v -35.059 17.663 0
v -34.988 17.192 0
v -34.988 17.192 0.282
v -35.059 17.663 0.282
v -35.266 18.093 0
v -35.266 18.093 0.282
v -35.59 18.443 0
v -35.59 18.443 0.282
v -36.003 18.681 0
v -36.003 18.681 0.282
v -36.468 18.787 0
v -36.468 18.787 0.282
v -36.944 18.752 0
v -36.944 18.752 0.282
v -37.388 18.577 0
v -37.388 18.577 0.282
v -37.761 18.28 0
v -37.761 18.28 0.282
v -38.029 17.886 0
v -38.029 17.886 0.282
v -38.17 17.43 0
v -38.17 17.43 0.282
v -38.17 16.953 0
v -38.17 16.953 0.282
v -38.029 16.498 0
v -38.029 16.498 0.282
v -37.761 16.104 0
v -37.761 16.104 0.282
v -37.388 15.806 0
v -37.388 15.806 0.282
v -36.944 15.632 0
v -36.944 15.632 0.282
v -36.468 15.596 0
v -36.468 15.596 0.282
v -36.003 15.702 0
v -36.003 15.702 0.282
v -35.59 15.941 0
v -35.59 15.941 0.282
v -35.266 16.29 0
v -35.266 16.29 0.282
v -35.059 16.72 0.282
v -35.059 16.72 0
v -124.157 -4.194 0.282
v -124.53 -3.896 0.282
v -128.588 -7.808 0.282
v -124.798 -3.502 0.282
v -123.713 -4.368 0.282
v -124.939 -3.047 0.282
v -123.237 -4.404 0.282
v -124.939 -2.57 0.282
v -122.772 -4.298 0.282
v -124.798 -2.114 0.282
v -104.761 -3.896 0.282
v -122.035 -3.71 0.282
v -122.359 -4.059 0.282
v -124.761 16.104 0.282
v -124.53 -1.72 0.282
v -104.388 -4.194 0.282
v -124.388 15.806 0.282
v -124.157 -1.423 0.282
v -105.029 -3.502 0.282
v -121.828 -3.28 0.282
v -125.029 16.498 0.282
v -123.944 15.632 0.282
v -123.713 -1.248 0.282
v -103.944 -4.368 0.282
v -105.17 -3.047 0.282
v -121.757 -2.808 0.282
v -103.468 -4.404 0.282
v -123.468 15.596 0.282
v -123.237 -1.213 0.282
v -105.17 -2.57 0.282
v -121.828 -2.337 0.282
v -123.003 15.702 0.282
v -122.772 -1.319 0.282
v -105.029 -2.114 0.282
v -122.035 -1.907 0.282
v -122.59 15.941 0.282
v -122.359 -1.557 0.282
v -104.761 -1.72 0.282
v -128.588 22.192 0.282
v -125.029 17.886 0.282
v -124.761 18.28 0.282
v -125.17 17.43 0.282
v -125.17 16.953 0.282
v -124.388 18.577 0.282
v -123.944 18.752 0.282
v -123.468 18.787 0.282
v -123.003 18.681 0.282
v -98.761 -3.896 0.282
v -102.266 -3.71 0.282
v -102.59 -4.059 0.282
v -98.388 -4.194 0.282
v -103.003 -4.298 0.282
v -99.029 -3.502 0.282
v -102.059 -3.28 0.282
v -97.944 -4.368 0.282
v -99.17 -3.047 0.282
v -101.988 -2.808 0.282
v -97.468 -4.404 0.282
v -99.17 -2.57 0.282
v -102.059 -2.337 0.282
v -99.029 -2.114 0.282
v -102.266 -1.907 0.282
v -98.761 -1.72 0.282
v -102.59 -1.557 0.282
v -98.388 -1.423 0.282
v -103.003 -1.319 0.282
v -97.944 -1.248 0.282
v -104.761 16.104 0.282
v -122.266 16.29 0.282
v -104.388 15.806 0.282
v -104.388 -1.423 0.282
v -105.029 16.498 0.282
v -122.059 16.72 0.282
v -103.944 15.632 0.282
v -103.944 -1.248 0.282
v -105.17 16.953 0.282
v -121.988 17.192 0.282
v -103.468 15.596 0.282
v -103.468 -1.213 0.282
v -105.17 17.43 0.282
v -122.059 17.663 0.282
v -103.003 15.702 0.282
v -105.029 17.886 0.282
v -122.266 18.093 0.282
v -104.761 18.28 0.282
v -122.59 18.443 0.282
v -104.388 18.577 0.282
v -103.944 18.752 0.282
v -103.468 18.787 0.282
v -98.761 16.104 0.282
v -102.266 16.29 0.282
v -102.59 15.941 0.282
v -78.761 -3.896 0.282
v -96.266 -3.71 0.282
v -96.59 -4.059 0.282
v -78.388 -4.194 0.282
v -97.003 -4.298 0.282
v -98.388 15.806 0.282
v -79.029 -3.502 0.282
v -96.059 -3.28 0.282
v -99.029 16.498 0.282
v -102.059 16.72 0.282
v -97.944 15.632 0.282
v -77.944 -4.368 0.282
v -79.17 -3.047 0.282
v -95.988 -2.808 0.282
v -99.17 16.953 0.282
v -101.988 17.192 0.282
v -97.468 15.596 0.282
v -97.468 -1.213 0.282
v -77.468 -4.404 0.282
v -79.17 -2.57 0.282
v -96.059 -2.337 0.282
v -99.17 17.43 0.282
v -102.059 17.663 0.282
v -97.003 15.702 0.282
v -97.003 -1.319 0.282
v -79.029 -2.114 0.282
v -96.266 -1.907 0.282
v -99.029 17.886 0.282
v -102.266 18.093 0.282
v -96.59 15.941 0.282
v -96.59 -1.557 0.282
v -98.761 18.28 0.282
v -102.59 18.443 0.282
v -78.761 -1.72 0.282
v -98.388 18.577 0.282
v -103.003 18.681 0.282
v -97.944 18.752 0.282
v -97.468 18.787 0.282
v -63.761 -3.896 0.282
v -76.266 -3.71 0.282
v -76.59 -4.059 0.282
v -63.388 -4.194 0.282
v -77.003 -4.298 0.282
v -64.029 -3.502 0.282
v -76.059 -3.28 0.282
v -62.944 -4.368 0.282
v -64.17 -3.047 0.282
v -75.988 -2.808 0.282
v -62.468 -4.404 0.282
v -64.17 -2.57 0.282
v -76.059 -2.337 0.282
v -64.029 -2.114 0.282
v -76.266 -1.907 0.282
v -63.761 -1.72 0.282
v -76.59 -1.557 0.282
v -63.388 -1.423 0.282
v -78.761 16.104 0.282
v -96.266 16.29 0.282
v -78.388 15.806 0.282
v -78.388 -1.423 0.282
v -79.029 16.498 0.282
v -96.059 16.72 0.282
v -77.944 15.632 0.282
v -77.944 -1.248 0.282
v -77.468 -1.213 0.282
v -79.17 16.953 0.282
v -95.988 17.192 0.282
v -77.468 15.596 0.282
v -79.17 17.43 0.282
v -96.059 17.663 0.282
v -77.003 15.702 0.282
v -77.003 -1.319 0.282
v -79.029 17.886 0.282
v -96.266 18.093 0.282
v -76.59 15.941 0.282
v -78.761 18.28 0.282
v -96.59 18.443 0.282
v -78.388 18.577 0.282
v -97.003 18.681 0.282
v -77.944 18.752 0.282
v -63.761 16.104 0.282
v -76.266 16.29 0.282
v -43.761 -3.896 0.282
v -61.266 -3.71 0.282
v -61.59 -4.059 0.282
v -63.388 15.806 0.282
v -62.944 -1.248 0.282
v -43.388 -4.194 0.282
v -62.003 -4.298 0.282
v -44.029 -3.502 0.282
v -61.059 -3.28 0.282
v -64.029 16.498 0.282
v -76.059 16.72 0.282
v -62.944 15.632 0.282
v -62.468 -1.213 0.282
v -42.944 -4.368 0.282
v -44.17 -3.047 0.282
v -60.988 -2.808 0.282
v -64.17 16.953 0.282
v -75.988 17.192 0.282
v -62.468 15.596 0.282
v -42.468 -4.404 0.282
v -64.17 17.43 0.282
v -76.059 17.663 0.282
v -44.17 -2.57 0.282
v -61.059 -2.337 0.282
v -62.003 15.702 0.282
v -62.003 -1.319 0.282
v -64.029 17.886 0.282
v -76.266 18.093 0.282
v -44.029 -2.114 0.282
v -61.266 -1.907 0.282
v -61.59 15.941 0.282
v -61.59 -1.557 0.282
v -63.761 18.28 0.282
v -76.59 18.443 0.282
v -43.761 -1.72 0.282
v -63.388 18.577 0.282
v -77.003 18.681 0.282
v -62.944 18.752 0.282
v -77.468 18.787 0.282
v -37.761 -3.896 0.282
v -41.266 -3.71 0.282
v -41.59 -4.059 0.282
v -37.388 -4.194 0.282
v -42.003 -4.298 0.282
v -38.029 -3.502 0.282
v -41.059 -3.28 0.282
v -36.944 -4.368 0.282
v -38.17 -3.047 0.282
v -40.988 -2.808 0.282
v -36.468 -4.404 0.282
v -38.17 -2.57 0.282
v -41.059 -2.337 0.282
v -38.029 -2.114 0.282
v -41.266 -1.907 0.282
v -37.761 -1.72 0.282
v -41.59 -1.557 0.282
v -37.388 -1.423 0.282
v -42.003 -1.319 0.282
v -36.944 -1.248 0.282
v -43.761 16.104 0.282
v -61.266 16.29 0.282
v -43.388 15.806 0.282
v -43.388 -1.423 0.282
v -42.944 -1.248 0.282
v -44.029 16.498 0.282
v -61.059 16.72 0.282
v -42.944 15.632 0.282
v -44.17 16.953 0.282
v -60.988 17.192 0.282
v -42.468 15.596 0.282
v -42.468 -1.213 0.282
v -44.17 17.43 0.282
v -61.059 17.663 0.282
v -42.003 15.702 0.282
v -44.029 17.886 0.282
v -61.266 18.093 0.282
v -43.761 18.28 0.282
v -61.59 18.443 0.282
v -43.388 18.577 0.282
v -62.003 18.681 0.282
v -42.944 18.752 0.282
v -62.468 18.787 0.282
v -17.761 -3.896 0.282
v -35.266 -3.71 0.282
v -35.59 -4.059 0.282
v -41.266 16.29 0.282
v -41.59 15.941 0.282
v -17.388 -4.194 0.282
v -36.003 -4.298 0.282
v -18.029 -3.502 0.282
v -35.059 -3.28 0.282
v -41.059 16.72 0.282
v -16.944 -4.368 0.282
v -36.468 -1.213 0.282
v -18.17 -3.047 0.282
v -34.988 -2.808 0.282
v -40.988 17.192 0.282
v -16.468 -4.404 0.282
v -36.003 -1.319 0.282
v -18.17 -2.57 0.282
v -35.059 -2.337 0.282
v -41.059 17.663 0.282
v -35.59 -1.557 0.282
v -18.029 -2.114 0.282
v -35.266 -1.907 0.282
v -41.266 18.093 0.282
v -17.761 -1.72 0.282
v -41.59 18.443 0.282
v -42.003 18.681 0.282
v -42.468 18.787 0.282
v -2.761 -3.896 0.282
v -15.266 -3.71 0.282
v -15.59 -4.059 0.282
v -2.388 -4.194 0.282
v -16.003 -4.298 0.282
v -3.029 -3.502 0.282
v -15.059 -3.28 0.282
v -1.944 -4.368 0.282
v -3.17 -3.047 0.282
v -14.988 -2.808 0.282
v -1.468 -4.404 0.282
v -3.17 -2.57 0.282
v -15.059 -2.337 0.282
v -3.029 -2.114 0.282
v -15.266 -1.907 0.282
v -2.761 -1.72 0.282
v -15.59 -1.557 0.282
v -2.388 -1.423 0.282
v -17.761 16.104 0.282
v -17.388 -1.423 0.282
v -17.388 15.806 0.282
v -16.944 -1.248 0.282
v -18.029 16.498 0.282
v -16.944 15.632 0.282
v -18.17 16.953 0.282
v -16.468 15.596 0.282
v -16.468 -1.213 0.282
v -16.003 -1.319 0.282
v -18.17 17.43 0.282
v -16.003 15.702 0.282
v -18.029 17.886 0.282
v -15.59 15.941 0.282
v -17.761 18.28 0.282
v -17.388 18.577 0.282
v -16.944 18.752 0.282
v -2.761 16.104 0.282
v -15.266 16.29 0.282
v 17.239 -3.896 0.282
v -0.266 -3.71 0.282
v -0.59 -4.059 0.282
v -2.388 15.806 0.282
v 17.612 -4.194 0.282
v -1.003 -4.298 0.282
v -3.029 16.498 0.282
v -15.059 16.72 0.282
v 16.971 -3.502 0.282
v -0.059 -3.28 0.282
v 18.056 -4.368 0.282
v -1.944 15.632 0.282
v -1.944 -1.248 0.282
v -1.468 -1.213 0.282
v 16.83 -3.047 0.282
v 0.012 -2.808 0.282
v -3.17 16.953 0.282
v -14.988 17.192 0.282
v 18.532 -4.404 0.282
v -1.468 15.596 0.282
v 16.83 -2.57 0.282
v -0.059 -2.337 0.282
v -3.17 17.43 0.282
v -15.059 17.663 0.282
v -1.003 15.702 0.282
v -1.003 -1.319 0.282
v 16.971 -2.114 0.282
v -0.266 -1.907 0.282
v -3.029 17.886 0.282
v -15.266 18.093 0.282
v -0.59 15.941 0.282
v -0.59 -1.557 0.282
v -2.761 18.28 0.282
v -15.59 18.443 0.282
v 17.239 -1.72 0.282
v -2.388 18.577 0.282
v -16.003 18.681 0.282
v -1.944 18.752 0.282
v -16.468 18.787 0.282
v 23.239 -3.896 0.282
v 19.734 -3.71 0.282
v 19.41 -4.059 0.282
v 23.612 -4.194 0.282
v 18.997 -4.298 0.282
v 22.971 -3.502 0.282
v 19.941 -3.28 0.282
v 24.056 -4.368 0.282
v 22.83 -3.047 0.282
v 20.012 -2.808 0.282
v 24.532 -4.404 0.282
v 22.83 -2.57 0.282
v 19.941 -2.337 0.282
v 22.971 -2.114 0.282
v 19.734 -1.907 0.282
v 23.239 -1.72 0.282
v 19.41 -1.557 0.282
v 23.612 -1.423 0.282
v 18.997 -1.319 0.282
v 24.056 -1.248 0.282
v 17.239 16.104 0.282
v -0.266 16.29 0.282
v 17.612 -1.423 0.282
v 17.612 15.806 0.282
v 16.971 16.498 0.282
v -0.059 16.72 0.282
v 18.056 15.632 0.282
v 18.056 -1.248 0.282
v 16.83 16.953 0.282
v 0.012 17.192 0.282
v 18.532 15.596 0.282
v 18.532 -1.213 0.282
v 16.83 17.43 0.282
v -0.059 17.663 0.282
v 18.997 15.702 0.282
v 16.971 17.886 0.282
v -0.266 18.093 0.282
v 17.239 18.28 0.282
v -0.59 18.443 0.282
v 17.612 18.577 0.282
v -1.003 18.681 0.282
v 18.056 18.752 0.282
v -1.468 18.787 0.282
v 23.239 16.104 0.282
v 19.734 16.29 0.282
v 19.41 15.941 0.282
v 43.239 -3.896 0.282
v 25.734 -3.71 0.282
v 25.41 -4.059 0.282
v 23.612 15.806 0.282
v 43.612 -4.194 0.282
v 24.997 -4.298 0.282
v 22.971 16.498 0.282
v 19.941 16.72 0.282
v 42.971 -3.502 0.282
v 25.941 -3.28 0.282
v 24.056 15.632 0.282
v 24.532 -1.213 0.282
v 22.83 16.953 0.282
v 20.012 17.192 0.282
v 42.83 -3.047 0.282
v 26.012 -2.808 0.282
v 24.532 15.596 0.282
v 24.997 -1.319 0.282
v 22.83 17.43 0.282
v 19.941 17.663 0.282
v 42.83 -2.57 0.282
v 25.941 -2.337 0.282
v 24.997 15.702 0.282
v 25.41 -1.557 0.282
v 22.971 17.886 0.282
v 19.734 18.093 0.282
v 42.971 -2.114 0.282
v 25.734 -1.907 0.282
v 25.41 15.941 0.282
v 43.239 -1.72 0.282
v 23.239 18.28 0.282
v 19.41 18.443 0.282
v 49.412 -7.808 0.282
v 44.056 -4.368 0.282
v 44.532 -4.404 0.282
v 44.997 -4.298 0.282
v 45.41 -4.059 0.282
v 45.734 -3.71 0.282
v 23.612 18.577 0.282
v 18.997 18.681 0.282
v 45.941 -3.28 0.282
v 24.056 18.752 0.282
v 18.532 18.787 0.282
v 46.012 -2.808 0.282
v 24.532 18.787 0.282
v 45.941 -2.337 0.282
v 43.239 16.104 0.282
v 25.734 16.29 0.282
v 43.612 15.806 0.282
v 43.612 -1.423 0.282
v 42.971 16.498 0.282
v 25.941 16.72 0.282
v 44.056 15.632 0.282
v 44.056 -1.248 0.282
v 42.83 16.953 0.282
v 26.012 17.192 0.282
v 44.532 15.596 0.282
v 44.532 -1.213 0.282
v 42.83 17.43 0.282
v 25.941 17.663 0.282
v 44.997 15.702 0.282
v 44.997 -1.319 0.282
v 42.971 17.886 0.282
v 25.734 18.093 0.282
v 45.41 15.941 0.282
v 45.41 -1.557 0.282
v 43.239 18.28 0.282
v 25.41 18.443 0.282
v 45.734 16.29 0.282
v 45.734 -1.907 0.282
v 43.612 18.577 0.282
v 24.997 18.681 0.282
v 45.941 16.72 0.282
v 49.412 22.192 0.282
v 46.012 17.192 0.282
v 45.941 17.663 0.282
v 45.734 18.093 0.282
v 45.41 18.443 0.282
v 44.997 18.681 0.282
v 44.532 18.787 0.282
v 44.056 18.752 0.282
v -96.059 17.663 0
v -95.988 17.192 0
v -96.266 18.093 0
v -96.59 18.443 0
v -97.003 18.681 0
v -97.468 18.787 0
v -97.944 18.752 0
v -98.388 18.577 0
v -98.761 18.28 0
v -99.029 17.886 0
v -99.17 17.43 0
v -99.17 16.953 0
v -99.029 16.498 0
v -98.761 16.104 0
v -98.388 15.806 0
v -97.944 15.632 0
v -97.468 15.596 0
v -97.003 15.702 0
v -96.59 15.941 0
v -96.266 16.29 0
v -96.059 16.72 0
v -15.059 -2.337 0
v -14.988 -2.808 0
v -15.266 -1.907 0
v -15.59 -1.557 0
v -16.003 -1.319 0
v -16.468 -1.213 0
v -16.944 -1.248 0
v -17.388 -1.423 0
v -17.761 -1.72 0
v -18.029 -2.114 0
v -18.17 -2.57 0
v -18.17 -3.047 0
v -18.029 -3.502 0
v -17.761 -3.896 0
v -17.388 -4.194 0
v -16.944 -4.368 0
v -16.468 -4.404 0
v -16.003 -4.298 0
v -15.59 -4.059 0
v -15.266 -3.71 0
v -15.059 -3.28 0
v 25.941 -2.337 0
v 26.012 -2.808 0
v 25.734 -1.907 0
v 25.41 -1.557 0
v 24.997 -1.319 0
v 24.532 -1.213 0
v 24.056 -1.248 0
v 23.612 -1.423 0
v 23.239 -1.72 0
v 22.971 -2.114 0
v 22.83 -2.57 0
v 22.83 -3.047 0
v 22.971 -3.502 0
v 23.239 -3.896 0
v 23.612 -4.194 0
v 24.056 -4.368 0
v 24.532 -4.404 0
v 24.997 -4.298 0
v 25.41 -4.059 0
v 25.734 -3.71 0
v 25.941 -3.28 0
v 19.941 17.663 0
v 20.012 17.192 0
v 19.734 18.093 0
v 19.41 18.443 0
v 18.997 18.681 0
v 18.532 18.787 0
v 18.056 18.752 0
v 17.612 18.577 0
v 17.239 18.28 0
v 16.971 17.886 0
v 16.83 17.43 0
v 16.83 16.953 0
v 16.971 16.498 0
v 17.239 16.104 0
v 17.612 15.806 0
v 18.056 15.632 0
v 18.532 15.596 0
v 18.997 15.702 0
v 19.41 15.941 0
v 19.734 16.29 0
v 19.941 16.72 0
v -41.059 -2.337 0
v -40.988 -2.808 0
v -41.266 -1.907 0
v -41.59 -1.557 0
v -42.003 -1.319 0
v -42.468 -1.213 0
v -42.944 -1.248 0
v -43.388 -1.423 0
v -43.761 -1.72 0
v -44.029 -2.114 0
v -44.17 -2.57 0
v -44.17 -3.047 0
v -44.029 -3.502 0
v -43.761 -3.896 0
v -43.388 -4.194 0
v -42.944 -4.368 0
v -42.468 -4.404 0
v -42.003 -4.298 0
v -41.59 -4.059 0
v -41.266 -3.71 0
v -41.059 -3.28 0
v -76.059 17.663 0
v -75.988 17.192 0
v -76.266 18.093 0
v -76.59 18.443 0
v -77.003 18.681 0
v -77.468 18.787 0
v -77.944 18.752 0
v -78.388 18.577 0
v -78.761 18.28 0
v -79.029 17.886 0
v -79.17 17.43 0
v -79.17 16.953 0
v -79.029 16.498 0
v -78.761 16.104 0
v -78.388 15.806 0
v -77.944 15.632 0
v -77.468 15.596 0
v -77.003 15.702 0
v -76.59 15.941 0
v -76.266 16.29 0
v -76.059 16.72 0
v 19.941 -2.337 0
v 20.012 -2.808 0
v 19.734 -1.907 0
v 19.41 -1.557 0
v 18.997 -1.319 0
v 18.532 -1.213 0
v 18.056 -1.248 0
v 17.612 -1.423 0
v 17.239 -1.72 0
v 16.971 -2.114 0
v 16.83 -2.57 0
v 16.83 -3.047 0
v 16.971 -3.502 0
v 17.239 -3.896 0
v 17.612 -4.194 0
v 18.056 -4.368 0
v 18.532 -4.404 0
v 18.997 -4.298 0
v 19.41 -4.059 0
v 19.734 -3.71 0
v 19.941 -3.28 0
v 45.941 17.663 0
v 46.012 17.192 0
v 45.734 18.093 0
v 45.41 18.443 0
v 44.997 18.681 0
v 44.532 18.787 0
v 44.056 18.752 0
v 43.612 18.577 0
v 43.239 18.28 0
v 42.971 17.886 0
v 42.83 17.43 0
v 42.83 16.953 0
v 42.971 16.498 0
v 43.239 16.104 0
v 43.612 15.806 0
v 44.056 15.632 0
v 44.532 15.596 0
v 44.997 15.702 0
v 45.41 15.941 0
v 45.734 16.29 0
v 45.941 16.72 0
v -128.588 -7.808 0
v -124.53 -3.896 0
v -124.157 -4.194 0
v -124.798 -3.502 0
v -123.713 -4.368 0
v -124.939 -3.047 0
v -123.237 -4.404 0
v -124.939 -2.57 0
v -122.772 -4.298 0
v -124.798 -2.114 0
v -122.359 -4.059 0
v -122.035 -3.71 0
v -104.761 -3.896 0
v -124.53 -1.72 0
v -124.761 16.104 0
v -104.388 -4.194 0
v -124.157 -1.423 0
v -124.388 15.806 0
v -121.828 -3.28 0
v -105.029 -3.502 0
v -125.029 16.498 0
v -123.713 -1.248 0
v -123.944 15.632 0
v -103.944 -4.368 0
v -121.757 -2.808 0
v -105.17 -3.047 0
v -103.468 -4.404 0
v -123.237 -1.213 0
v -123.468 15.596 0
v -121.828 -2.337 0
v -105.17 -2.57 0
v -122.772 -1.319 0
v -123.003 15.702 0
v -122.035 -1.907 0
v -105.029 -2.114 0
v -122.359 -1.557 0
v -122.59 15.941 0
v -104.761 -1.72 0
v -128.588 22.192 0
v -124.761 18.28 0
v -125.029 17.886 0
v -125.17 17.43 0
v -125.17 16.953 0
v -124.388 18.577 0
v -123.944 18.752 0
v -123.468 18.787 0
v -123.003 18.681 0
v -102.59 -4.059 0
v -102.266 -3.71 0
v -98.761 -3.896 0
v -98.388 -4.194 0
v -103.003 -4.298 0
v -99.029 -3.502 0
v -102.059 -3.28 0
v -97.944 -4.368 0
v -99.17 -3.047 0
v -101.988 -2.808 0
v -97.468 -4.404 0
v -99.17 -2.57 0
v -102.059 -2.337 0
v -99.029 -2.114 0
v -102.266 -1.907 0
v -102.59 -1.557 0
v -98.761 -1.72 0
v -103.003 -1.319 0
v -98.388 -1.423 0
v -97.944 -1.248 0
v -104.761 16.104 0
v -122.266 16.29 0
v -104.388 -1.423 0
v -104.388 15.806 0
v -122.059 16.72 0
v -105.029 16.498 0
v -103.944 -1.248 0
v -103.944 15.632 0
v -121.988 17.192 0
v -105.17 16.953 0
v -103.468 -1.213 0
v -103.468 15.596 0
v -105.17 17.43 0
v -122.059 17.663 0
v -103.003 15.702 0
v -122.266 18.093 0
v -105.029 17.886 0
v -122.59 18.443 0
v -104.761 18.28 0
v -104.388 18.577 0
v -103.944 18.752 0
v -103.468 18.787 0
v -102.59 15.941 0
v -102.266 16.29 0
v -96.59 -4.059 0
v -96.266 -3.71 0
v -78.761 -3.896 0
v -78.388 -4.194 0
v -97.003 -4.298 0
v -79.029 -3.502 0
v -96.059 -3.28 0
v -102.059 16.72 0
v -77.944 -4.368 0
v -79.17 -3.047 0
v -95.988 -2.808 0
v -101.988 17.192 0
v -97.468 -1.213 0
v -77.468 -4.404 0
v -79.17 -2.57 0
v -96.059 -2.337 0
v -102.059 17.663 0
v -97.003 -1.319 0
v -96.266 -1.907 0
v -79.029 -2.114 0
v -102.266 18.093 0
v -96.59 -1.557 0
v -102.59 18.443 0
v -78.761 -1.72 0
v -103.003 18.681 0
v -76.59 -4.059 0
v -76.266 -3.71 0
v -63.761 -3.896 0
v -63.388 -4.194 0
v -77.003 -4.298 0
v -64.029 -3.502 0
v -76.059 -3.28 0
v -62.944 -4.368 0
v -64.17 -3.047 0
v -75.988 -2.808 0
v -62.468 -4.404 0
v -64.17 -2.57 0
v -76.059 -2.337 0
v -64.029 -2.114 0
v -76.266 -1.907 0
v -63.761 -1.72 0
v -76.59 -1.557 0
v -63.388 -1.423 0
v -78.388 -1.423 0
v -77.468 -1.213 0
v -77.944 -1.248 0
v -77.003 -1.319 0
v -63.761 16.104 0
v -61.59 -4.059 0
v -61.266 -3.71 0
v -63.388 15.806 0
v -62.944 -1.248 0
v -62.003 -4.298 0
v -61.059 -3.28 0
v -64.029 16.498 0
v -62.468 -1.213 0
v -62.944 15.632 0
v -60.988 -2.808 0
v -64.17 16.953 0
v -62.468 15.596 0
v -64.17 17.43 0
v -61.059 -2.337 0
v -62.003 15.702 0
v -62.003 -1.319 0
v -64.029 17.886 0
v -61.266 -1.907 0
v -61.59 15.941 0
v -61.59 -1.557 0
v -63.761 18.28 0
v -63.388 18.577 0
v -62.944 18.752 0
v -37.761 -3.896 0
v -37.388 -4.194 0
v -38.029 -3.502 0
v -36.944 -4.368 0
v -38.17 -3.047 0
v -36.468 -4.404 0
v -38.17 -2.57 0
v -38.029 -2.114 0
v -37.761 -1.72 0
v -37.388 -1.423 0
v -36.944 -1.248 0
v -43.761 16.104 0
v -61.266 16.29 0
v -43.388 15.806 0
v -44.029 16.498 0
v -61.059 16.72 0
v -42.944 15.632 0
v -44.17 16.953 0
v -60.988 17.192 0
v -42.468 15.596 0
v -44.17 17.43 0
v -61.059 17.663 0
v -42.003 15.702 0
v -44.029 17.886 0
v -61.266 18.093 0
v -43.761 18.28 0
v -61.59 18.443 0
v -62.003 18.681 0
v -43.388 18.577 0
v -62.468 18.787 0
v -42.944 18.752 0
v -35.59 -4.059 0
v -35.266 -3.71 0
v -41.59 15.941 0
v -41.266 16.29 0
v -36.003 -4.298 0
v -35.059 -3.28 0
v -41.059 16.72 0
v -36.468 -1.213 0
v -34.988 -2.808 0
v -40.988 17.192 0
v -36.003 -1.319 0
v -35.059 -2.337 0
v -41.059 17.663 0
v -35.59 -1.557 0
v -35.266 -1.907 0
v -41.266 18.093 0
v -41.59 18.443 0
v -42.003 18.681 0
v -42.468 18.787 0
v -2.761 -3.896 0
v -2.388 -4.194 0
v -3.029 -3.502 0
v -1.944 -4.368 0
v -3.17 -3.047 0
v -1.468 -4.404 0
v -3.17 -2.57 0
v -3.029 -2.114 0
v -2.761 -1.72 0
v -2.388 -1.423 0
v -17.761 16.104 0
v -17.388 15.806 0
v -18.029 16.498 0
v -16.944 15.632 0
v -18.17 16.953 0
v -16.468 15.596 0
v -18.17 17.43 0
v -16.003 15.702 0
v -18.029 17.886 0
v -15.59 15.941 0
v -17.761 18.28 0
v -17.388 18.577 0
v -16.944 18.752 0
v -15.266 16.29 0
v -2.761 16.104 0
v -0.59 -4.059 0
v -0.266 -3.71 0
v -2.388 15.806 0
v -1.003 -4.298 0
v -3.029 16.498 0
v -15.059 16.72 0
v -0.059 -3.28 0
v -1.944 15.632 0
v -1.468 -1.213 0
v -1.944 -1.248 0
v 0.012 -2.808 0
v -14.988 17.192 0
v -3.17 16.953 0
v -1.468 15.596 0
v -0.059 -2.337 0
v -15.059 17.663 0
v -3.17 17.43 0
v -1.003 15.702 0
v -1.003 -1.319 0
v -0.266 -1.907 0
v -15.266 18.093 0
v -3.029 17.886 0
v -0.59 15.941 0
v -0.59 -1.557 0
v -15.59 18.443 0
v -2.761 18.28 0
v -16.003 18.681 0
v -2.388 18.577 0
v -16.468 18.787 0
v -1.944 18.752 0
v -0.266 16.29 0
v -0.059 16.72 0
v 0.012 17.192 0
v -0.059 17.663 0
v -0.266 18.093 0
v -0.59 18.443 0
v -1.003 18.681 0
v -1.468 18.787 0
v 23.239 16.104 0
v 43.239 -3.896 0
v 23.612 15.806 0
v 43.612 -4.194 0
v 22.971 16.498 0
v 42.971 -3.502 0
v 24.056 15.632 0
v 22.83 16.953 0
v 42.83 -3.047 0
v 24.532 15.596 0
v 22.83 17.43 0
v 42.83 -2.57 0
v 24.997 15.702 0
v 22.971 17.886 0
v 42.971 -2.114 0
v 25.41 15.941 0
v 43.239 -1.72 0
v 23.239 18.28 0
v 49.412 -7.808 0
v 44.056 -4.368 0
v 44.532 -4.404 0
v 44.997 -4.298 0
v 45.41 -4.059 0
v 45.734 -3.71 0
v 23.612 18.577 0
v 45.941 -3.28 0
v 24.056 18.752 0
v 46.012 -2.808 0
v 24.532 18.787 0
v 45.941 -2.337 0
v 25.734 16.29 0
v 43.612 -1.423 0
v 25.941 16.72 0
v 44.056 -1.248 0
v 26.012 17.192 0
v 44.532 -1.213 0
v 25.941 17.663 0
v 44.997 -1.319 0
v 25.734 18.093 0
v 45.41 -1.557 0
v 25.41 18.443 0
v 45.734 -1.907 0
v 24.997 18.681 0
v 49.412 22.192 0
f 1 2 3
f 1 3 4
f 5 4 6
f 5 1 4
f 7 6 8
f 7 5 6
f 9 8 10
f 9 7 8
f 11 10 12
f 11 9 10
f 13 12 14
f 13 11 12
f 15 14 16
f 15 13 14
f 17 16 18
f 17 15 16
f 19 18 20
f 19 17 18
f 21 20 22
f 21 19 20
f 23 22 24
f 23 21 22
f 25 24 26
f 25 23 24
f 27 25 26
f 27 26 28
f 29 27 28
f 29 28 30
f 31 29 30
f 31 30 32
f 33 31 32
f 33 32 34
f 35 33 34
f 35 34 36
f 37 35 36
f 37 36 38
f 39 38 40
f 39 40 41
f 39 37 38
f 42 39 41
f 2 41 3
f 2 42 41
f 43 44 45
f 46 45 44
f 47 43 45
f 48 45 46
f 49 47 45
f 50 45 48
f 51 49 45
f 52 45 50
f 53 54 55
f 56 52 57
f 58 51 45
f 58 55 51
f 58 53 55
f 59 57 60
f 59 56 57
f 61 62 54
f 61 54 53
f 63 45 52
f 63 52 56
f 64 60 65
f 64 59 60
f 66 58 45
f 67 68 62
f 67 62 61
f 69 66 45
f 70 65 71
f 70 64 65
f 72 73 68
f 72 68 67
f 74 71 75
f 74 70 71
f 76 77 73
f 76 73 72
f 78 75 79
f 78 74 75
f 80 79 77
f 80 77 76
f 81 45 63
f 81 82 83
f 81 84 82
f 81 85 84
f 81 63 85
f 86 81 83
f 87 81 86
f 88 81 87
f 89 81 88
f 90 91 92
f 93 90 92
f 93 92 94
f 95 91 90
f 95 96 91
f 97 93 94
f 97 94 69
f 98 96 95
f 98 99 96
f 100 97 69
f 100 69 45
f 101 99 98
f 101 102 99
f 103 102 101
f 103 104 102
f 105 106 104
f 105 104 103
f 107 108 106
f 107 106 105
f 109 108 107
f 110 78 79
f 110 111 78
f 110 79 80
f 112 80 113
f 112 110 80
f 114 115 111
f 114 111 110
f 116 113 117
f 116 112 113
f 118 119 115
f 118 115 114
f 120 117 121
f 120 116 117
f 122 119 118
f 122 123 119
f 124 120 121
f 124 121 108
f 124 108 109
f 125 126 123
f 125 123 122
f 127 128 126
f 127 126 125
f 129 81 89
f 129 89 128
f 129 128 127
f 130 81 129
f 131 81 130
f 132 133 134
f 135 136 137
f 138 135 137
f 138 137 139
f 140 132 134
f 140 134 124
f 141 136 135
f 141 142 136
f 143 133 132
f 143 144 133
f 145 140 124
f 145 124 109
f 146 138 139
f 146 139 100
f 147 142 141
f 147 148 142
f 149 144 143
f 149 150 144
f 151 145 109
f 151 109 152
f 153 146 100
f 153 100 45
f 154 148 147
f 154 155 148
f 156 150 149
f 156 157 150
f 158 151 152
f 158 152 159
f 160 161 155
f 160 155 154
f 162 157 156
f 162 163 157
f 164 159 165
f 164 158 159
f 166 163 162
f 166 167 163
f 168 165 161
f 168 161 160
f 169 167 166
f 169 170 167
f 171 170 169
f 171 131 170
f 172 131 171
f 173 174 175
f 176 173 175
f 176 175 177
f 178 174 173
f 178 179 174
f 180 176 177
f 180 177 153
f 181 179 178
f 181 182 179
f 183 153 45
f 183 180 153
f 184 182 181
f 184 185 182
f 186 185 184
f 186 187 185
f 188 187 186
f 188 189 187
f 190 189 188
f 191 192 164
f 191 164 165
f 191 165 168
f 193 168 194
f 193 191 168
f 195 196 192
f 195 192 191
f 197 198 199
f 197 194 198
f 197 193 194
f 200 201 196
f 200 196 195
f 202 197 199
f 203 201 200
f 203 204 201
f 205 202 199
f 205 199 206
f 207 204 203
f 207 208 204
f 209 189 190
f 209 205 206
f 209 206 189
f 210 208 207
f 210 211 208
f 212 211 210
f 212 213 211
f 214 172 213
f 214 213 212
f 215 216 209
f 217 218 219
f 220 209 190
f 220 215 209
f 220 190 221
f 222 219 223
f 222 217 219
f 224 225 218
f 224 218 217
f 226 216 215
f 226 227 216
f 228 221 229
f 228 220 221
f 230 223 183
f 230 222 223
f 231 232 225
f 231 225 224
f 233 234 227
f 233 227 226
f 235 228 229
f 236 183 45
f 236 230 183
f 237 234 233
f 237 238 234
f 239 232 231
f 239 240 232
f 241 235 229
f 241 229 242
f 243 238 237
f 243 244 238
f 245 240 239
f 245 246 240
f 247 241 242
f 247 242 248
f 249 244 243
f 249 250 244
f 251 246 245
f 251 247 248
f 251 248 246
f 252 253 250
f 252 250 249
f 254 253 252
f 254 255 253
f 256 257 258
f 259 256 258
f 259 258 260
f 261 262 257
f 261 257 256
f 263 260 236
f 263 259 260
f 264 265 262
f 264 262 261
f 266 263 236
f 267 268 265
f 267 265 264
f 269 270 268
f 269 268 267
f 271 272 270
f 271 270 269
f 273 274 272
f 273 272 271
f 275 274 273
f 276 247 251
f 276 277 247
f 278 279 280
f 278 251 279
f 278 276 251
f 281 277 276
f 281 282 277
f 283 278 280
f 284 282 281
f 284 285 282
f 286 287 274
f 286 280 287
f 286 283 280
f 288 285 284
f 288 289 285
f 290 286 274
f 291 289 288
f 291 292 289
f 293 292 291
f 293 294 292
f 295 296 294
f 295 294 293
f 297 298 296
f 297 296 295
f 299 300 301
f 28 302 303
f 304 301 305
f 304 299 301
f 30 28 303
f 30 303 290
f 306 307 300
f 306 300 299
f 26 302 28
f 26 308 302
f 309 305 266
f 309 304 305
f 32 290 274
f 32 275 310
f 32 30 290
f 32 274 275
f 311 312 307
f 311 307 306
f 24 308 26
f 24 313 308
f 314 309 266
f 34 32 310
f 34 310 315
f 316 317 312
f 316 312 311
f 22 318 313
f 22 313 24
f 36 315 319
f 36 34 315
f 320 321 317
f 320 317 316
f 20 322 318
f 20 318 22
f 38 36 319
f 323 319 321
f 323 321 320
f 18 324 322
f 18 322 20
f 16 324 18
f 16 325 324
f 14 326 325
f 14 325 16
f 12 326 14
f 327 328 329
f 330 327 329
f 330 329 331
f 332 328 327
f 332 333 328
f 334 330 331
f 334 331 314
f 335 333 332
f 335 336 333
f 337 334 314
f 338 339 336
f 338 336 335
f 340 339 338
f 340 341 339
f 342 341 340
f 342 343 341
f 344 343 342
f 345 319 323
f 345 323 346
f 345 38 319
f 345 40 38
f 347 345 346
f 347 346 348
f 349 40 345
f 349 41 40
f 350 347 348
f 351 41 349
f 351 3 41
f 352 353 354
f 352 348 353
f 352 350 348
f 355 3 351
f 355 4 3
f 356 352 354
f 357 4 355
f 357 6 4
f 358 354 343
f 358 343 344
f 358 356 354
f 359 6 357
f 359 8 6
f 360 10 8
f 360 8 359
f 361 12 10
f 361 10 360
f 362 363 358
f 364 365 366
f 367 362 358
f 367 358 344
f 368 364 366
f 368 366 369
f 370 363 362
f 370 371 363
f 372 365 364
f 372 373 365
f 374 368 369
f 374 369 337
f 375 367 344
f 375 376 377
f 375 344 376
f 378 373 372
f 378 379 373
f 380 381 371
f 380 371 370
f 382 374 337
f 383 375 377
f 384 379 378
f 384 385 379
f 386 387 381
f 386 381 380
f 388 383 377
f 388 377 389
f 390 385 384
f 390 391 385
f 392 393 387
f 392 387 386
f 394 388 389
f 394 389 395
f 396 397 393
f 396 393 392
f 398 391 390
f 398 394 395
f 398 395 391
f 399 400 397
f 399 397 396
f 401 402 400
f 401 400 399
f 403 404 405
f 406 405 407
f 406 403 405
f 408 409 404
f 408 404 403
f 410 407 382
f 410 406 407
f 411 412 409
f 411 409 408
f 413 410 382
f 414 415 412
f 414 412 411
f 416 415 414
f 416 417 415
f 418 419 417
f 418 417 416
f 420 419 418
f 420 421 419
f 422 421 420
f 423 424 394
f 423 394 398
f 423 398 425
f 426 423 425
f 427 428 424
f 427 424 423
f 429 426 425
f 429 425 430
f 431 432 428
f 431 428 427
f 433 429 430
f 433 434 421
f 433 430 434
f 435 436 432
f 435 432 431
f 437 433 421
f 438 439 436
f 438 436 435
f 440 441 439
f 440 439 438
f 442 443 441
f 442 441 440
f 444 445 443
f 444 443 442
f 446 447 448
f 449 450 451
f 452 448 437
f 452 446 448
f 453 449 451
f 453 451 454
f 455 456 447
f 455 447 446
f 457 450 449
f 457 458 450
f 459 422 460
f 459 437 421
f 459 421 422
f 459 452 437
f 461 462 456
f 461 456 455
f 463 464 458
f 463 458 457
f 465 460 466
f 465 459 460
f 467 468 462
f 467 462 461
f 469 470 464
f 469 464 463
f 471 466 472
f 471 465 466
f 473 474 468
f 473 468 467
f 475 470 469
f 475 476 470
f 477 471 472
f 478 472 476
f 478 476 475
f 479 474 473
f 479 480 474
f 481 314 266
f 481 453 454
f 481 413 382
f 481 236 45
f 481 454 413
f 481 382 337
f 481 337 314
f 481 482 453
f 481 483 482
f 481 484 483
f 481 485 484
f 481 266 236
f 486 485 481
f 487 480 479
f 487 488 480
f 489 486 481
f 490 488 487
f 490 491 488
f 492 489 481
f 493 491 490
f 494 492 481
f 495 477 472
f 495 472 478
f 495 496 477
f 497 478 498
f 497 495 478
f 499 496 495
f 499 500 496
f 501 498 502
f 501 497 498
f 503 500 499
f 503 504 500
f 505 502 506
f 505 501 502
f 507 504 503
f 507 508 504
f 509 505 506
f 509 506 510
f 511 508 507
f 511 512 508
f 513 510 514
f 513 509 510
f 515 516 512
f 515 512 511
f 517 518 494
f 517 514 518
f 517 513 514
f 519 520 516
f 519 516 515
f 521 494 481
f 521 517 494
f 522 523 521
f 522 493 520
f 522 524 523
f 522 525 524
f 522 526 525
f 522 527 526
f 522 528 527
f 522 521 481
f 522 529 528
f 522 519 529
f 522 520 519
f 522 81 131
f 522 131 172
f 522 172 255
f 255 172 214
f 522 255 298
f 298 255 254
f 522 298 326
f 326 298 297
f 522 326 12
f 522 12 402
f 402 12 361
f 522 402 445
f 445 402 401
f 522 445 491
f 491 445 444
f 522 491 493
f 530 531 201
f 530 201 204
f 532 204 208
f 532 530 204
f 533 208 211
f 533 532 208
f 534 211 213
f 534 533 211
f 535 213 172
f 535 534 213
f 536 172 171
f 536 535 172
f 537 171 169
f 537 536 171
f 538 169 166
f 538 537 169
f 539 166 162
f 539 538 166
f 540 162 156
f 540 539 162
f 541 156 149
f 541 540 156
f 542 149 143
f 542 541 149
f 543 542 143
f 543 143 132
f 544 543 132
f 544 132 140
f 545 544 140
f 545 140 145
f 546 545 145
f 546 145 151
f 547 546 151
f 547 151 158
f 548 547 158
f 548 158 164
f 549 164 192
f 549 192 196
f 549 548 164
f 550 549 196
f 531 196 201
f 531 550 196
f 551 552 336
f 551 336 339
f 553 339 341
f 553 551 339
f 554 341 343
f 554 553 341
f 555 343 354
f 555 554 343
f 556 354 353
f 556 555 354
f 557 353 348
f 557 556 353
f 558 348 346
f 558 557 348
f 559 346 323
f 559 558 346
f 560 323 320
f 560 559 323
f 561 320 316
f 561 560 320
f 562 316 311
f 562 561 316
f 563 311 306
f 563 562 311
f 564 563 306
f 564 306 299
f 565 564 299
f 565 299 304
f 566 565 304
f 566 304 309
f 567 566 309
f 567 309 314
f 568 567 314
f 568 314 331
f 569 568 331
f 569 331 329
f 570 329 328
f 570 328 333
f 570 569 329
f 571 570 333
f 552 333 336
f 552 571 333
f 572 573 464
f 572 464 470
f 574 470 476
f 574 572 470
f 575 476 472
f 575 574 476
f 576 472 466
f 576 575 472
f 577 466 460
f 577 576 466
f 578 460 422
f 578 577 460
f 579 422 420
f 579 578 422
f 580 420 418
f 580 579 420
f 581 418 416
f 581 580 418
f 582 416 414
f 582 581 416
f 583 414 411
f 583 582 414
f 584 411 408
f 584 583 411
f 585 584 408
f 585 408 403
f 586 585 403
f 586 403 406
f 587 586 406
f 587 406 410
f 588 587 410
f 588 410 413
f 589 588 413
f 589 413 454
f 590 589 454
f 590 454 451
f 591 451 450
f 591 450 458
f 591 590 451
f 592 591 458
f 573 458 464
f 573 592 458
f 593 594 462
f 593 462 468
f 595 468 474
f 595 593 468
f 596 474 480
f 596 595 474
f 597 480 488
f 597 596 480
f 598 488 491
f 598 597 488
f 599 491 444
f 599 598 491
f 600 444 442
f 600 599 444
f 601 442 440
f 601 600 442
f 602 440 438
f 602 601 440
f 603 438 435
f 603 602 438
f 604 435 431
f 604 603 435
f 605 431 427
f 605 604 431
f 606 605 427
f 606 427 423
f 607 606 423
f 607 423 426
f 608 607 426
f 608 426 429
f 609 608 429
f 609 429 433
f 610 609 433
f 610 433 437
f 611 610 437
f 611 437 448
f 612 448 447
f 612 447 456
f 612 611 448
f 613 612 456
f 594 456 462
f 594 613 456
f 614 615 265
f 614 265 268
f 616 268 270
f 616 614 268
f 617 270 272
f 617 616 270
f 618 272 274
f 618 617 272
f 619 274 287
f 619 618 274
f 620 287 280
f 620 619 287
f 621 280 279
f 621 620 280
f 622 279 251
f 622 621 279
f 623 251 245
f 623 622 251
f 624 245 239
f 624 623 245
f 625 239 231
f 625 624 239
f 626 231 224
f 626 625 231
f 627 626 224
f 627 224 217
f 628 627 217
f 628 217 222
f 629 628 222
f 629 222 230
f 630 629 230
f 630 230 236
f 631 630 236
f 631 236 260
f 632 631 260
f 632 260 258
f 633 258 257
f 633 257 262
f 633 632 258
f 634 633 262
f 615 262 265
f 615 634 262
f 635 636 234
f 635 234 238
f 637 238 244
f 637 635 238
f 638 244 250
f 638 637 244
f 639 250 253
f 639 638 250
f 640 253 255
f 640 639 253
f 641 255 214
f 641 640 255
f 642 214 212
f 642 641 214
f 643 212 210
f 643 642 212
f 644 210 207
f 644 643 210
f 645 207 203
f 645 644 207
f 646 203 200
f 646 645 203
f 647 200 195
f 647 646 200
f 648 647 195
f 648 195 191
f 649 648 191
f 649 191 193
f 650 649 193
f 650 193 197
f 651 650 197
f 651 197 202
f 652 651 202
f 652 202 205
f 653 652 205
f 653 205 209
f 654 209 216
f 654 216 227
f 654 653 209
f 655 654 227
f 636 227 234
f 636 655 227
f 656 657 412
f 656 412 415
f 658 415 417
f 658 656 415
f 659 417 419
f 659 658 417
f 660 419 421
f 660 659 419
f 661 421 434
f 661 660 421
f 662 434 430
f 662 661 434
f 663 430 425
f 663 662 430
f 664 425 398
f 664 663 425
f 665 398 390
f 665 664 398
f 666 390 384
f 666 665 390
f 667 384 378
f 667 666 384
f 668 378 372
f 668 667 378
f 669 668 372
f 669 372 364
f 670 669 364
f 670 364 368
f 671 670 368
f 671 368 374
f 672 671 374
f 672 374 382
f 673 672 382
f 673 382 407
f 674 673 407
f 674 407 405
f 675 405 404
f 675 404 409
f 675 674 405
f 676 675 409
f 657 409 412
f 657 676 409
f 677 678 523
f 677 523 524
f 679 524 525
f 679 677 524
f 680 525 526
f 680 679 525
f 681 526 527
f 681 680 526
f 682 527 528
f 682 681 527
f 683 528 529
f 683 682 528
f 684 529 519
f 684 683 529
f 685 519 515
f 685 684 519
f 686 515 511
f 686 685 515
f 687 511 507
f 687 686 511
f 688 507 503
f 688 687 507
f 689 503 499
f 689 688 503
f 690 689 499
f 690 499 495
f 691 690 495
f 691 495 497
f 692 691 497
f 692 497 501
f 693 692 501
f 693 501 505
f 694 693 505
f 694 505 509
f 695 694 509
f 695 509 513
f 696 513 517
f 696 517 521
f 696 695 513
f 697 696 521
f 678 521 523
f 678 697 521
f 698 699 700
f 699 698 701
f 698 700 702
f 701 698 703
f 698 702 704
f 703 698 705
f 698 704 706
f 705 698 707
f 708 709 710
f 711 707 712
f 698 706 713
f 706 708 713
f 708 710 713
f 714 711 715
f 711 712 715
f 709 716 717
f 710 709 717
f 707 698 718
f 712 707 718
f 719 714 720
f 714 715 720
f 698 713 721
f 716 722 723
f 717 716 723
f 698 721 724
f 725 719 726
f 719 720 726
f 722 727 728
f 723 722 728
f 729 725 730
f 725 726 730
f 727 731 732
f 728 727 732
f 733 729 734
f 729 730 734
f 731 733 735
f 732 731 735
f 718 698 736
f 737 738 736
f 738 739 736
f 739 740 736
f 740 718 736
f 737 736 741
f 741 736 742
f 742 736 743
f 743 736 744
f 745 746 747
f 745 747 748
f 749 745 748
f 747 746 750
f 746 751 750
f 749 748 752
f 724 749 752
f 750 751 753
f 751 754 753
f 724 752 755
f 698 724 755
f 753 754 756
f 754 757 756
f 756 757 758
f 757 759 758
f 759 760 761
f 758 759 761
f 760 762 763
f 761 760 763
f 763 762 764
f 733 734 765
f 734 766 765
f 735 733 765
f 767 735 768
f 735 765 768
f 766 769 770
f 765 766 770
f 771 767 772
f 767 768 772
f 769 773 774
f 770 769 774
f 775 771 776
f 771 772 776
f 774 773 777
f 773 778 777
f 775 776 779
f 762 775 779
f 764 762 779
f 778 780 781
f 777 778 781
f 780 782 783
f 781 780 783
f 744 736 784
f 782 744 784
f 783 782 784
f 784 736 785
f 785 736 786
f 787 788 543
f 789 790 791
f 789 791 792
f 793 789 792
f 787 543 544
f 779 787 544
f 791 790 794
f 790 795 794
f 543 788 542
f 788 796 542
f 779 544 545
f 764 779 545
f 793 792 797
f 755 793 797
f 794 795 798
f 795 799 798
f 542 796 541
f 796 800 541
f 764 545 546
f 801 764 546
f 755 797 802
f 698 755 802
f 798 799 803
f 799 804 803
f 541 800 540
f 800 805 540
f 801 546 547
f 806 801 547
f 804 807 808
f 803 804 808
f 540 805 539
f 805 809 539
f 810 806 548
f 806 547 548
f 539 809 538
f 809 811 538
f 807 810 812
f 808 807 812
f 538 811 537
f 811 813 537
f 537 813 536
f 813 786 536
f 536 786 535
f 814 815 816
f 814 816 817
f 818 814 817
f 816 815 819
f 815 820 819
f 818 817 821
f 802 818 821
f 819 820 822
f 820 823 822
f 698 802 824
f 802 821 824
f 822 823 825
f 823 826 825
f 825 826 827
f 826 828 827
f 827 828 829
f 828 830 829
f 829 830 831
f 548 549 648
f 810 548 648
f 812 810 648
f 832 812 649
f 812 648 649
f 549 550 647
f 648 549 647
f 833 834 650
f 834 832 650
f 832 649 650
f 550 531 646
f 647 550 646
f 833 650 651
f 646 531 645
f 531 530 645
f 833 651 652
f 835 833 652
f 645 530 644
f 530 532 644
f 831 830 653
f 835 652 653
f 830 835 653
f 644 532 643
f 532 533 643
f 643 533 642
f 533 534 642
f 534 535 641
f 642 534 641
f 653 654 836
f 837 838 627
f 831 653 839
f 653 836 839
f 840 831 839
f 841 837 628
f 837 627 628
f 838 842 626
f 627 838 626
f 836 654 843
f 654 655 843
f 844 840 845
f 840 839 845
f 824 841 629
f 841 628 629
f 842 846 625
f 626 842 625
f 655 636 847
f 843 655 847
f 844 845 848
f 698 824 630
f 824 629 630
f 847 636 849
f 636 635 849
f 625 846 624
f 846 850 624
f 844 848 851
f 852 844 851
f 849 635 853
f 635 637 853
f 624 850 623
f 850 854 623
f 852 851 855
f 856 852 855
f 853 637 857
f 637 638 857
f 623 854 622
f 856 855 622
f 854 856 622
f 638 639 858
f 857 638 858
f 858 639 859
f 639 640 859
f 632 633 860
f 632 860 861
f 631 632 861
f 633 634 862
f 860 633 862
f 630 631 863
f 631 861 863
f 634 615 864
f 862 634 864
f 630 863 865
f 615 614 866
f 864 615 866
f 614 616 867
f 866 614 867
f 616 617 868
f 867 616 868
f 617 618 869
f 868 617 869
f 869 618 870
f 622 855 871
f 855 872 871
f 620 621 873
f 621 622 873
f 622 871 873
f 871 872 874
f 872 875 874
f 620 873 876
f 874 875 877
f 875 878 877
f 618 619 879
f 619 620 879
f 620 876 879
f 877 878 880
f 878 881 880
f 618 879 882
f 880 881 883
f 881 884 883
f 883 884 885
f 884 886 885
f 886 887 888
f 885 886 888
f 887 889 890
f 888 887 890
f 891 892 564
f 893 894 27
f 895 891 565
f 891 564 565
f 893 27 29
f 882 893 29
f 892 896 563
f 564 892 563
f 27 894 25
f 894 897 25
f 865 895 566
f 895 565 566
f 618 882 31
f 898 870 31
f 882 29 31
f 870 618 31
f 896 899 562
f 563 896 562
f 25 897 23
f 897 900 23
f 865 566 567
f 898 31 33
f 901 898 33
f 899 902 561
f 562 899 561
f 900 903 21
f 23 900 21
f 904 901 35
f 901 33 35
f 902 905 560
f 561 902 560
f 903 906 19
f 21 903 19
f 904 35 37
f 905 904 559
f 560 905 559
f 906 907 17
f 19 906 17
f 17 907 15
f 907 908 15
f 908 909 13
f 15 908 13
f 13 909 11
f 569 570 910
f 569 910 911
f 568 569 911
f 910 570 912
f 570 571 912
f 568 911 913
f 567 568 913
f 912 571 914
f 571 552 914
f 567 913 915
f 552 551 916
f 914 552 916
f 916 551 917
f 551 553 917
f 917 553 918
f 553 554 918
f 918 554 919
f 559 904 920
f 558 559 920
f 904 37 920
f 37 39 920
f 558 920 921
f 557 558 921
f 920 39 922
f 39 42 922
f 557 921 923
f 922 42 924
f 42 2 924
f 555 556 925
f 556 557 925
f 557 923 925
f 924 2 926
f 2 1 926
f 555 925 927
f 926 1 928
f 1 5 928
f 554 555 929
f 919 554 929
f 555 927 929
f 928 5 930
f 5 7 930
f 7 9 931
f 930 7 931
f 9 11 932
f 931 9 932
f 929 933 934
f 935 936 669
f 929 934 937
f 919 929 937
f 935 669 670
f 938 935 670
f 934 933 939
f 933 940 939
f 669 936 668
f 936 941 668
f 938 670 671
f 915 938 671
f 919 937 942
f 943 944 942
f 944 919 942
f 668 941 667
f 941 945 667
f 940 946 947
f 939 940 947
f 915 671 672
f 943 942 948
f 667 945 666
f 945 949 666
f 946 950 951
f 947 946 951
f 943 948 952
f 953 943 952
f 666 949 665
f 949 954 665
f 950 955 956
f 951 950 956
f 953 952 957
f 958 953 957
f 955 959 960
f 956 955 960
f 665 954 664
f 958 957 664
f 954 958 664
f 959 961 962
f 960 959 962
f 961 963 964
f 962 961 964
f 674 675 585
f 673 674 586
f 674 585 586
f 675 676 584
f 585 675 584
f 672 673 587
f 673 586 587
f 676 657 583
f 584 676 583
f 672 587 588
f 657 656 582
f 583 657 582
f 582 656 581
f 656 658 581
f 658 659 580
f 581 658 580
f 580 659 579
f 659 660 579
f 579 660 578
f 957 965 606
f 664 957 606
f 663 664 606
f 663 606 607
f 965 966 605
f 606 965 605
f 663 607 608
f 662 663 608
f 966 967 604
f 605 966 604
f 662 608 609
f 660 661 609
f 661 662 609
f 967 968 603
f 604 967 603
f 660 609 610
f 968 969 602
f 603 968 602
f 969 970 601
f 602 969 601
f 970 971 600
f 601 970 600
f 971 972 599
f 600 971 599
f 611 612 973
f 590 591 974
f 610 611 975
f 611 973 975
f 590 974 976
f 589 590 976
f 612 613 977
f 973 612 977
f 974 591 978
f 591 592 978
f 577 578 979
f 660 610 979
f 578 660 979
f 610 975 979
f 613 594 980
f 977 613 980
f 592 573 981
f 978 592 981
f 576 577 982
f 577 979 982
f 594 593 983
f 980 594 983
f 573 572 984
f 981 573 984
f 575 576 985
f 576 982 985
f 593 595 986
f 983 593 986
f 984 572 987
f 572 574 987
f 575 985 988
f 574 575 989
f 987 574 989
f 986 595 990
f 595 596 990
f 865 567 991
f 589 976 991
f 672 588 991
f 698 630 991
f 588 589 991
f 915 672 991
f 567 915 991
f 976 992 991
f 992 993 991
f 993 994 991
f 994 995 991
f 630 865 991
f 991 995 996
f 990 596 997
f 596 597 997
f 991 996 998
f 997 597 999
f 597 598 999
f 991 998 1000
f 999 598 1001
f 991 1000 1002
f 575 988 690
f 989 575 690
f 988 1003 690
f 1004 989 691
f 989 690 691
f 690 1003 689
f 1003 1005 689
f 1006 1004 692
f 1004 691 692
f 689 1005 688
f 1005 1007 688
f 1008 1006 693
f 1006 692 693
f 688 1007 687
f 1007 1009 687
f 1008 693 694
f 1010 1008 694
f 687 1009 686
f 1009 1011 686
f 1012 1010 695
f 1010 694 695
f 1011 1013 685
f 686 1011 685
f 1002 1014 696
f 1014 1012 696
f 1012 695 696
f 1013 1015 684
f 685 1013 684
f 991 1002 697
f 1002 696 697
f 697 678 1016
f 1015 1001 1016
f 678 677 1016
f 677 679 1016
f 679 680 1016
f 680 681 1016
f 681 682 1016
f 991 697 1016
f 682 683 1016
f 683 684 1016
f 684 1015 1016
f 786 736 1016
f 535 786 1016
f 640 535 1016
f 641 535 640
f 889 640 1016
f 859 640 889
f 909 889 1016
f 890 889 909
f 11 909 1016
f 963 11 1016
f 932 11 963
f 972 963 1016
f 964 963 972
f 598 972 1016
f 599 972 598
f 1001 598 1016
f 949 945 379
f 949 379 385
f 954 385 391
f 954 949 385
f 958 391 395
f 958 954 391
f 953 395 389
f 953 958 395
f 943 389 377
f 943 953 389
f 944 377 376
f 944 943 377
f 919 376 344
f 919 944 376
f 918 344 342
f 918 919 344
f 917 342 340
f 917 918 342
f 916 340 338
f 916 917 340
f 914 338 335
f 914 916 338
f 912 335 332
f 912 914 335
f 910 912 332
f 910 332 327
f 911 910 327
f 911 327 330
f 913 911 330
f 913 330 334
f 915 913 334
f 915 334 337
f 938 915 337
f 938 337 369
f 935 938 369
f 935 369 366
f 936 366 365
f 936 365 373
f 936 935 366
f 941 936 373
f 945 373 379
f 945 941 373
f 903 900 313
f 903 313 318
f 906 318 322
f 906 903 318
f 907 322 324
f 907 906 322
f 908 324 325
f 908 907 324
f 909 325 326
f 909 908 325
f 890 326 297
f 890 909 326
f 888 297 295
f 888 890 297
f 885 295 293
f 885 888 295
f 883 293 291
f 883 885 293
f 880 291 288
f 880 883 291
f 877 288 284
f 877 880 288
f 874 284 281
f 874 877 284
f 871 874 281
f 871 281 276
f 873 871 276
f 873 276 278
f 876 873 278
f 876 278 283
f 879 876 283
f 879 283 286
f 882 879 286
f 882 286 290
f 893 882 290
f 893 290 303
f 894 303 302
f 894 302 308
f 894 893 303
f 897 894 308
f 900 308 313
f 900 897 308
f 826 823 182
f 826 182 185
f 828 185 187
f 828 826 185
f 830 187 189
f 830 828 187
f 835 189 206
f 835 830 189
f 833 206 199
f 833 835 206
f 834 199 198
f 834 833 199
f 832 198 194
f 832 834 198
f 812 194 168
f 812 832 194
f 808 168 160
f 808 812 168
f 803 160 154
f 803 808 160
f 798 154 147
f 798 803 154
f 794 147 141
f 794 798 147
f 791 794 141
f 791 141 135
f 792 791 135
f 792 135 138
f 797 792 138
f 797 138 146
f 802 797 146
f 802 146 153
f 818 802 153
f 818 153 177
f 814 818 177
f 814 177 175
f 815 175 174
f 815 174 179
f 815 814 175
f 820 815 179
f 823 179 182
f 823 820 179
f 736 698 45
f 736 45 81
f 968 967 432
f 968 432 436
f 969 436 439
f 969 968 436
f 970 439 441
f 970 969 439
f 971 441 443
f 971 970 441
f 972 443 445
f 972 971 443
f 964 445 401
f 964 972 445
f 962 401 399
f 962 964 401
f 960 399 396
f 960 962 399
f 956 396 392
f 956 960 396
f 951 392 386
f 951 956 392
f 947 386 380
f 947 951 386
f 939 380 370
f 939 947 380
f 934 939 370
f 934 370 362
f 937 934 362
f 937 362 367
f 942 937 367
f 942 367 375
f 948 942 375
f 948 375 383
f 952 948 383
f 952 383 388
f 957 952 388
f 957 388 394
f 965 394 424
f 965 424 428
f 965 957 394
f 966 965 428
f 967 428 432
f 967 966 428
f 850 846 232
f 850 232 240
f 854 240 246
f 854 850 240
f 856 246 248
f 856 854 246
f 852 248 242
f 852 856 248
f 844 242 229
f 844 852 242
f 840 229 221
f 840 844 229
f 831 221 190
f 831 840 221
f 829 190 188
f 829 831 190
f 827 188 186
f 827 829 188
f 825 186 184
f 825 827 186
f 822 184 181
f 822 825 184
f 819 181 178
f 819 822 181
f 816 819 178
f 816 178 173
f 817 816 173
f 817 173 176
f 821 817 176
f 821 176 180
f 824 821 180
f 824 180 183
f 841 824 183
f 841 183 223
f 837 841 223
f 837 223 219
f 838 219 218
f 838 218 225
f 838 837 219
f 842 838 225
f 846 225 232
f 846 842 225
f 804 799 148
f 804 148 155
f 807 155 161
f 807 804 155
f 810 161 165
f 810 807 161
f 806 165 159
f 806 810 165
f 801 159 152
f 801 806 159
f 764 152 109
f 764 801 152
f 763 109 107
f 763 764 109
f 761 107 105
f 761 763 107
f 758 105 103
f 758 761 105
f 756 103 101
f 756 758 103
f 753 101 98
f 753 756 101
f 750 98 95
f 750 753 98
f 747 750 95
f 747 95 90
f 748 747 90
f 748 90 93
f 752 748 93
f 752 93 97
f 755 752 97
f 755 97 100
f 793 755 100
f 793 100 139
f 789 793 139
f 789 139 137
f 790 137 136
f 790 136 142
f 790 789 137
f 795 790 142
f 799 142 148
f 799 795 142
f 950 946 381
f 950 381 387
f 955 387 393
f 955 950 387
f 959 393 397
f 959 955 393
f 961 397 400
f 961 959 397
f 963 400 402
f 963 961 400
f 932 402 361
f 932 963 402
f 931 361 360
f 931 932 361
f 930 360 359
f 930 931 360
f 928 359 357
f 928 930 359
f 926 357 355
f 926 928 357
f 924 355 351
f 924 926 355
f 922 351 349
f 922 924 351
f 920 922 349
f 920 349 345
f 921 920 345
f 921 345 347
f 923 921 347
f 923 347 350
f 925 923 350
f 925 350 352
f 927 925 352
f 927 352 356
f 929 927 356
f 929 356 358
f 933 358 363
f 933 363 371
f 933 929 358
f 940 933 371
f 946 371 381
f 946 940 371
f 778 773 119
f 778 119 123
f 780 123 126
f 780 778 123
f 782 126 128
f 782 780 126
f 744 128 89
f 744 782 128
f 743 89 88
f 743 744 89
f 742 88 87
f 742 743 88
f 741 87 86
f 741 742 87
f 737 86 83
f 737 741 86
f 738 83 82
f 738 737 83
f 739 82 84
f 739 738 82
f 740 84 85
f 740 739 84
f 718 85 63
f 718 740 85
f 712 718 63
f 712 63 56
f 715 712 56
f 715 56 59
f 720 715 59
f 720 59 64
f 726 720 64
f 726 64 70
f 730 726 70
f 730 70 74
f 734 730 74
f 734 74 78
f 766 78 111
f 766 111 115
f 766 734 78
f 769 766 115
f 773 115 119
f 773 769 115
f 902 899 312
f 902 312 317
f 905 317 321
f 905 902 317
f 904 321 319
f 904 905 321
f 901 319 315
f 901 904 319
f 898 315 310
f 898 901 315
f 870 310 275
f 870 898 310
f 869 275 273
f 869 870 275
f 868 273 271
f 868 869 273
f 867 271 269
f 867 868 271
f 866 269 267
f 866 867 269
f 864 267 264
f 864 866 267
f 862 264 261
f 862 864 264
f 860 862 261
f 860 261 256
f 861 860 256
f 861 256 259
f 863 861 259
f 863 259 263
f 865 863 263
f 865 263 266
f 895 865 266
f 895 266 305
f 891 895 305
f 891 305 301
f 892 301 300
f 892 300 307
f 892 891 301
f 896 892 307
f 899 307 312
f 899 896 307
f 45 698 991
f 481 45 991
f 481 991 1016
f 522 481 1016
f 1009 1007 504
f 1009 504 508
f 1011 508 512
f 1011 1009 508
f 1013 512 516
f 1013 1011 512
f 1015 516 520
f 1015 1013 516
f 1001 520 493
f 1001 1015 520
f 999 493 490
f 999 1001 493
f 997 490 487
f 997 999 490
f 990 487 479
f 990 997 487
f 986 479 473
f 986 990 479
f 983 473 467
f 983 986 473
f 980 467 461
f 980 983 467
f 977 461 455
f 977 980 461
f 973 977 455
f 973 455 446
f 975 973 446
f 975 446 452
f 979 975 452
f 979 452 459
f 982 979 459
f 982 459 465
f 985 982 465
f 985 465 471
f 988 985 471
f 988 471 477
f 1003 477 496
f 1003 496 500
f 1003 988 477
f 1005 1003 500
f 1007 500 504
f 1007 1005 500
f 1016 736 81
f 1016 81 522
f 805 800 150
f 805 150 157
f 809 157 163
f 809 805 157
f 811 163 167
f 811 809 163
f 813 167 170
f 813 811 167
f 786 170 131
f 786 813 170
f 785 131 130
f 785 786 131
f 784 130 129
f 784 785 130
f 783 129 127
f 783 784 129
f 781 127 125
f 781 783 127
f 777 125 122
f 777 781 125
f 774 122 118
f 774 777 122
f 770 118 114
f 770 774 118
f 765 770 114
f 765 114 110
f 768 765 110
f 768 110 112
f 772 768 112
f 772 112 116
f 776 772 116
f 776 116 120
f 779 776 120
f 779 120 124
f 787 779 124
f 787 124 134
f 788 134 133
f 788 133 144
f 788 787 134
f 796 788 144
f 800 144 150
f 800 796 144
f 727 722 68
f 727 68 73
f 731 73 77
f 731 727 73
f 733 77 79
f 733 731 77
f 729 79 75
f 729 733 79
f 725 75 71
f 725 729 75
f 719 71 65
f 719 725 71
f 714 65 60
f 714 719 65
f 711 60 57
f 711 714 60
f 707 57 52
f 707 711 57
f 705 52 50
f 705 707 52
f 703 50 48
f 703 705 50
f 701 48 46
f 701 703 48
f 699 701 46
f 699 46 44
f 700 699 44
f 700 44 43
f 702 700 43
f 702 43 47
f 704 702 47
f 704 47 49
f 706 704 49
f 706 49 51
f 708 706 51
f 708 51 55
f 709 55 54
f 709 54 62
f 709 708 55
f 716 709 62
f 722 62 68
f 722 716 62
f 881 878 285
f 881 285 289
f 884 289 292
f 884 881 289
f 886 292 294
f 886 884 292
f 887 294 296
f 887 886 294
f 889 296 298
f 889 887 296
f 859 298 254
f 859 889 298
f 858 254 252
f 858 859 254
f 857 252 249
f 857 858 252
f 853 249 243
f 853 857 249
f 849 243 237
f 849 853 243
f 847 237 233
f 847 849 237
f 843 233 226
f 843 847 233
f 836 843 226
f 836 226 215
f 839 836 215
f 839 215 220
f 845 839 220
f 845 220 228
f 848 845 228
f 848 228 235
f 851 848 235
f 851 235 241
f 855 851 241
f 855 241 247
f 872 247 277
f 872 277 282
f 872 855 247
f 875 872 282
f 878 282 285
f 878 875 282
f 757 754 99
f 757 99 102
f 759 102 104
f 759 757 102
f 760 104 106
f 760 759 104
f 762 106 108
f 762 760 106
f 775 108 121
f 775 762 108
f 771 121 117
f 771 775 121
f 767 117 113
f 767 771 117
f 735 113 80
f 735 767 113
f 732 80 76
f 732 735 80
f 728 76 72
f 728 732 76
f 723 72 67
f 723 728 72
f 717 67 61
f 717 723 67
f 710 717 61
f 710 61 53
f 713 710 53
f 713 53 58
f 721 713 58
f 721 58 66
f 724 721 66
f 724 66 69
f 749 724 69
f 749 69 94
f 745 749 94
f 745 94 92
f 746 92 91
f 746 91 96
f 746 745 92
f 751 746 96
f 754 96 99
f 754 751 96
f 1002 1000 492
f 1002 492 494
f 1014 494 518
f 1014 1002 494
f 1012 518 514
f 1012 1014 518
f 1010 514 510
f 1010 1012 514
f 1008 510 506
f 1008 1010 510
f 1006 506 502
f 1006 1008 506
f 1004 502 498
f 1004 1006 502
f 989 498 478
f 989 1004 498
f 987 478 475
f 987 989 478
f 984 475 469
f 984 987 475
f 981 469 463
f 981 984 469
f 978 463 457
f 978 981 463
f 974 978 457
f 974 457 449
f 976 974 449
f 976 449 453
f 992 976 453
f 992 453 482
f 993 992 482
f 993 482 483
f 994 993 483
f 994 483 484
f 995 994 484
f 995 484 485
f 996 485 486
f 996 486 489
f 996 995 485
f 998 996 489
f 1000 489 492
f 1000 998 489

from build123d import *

# Parameters (mm, degrees)
F0_W     = 178
F0_H     = 30
F0_R     = 1.6
F1_DEPTH = 0.282222


with BuildPart() as f1:
    # F0 (on Top) → F1 (new body)
    with BuildSketch(Plane.XY):
        with Locations((-39.587713, 7.19178)):
            Rectangle(F0_W, F0_H)
        with Locations((-123.356734, -2.80822)):
            Circle(F0_R, mode=Mode.SUBTRACT)
        with Locations((-103.587713, -2.80822)):
            Circle(F0_R, mode=Mode.SUBTRACT)
        with Locations((-97.587713, -2.80822)):
            Circle(F0_R, mode=Mode.SUBTRACT)
        with Locations((-77.587713, -2.80822)):
            Circle(F0_R, mode=Mode.SUBTRACT)
        with Locations((-62.587713, -2.80822)):
            Circle(F0_R, mode=Mode.SUBTRACT)
        with Locations((-42.587713, -2.80822)):
            Circle(F0_R, mode=Mode.SUBTRACT)
        with Locations((-36.587713, -2.80822)):
            Circle(F0_R, mode=Mode.SUBTRACT)
        with Locations((-16.587713, -2.80822)):
            Circle(F0_R, mode=Mode.SUBTRACT)
        with Locations((-1.587713, -2.80822)):
            Circle(F0_R, mode=Mode.SUBTRACT)
        with Locations((18.412287, -2.80822)):
            Circle(F0_R, mode=Mode.SUBTRACT)
        with Locations((24.412287, -2.80822)):
            Circle(F0_R, mode=Mode.SUBTRACT)
        with Locations((44.412287, -2.80822)):
            Circle(F0_R, mode=Mode.SUBTRACT)
        with Locations((-123.587713, 17.19178)):
            Circle(F0_R, mode=Mode.SUBTRACT)
        with Locations((-103.587713, 17.19178)):
            Circle(F0_R, mode=Mode.SUBTRACT)
        with Locations((-97.587713, 17.19178)):
            Circle(F0_R, mode=Mode.SUBTRACT)
        with Locations((-77.587713, 17.19178)):
            Circle(F0_R, mode=Mode.SUBTRACT)
        with Locations((-62.587713, 17.19178)):
            Circle(F0_R, mode=Mode.SUBTRACT)
        with Locations((-42.587713, 17.19178)):
            Circle(F0_R, mode=Mode.SUBTRACT)
        with Locations((-36.587713, 17.19178)):
            Circle(F0_R, mode=Mode.SUBTRACT)
        with Locations((-16.587713, 17.19178)):
            Circle(F0_R, mode=Mode.SUBTRACT)
        with Locations((-1.587713, 17.19178)):
            Circle(F0_R, mode=Mode.SUBTRACT)
        with Locations((18.412287, 17.19178)):
            Circle(F0_R, mode=Mode.SUBTRACT)
        with Locations((24.412287, 17.19178)):
            Circle(F0_R, mode=Mode.SUBTRACT)
        with Locations((44.412287, 17.19178)):
            Circle(F0_R, mode=Mode.SUBTRACT)
    extrude(amount=F1_DEPTH)


solid = f1.part
